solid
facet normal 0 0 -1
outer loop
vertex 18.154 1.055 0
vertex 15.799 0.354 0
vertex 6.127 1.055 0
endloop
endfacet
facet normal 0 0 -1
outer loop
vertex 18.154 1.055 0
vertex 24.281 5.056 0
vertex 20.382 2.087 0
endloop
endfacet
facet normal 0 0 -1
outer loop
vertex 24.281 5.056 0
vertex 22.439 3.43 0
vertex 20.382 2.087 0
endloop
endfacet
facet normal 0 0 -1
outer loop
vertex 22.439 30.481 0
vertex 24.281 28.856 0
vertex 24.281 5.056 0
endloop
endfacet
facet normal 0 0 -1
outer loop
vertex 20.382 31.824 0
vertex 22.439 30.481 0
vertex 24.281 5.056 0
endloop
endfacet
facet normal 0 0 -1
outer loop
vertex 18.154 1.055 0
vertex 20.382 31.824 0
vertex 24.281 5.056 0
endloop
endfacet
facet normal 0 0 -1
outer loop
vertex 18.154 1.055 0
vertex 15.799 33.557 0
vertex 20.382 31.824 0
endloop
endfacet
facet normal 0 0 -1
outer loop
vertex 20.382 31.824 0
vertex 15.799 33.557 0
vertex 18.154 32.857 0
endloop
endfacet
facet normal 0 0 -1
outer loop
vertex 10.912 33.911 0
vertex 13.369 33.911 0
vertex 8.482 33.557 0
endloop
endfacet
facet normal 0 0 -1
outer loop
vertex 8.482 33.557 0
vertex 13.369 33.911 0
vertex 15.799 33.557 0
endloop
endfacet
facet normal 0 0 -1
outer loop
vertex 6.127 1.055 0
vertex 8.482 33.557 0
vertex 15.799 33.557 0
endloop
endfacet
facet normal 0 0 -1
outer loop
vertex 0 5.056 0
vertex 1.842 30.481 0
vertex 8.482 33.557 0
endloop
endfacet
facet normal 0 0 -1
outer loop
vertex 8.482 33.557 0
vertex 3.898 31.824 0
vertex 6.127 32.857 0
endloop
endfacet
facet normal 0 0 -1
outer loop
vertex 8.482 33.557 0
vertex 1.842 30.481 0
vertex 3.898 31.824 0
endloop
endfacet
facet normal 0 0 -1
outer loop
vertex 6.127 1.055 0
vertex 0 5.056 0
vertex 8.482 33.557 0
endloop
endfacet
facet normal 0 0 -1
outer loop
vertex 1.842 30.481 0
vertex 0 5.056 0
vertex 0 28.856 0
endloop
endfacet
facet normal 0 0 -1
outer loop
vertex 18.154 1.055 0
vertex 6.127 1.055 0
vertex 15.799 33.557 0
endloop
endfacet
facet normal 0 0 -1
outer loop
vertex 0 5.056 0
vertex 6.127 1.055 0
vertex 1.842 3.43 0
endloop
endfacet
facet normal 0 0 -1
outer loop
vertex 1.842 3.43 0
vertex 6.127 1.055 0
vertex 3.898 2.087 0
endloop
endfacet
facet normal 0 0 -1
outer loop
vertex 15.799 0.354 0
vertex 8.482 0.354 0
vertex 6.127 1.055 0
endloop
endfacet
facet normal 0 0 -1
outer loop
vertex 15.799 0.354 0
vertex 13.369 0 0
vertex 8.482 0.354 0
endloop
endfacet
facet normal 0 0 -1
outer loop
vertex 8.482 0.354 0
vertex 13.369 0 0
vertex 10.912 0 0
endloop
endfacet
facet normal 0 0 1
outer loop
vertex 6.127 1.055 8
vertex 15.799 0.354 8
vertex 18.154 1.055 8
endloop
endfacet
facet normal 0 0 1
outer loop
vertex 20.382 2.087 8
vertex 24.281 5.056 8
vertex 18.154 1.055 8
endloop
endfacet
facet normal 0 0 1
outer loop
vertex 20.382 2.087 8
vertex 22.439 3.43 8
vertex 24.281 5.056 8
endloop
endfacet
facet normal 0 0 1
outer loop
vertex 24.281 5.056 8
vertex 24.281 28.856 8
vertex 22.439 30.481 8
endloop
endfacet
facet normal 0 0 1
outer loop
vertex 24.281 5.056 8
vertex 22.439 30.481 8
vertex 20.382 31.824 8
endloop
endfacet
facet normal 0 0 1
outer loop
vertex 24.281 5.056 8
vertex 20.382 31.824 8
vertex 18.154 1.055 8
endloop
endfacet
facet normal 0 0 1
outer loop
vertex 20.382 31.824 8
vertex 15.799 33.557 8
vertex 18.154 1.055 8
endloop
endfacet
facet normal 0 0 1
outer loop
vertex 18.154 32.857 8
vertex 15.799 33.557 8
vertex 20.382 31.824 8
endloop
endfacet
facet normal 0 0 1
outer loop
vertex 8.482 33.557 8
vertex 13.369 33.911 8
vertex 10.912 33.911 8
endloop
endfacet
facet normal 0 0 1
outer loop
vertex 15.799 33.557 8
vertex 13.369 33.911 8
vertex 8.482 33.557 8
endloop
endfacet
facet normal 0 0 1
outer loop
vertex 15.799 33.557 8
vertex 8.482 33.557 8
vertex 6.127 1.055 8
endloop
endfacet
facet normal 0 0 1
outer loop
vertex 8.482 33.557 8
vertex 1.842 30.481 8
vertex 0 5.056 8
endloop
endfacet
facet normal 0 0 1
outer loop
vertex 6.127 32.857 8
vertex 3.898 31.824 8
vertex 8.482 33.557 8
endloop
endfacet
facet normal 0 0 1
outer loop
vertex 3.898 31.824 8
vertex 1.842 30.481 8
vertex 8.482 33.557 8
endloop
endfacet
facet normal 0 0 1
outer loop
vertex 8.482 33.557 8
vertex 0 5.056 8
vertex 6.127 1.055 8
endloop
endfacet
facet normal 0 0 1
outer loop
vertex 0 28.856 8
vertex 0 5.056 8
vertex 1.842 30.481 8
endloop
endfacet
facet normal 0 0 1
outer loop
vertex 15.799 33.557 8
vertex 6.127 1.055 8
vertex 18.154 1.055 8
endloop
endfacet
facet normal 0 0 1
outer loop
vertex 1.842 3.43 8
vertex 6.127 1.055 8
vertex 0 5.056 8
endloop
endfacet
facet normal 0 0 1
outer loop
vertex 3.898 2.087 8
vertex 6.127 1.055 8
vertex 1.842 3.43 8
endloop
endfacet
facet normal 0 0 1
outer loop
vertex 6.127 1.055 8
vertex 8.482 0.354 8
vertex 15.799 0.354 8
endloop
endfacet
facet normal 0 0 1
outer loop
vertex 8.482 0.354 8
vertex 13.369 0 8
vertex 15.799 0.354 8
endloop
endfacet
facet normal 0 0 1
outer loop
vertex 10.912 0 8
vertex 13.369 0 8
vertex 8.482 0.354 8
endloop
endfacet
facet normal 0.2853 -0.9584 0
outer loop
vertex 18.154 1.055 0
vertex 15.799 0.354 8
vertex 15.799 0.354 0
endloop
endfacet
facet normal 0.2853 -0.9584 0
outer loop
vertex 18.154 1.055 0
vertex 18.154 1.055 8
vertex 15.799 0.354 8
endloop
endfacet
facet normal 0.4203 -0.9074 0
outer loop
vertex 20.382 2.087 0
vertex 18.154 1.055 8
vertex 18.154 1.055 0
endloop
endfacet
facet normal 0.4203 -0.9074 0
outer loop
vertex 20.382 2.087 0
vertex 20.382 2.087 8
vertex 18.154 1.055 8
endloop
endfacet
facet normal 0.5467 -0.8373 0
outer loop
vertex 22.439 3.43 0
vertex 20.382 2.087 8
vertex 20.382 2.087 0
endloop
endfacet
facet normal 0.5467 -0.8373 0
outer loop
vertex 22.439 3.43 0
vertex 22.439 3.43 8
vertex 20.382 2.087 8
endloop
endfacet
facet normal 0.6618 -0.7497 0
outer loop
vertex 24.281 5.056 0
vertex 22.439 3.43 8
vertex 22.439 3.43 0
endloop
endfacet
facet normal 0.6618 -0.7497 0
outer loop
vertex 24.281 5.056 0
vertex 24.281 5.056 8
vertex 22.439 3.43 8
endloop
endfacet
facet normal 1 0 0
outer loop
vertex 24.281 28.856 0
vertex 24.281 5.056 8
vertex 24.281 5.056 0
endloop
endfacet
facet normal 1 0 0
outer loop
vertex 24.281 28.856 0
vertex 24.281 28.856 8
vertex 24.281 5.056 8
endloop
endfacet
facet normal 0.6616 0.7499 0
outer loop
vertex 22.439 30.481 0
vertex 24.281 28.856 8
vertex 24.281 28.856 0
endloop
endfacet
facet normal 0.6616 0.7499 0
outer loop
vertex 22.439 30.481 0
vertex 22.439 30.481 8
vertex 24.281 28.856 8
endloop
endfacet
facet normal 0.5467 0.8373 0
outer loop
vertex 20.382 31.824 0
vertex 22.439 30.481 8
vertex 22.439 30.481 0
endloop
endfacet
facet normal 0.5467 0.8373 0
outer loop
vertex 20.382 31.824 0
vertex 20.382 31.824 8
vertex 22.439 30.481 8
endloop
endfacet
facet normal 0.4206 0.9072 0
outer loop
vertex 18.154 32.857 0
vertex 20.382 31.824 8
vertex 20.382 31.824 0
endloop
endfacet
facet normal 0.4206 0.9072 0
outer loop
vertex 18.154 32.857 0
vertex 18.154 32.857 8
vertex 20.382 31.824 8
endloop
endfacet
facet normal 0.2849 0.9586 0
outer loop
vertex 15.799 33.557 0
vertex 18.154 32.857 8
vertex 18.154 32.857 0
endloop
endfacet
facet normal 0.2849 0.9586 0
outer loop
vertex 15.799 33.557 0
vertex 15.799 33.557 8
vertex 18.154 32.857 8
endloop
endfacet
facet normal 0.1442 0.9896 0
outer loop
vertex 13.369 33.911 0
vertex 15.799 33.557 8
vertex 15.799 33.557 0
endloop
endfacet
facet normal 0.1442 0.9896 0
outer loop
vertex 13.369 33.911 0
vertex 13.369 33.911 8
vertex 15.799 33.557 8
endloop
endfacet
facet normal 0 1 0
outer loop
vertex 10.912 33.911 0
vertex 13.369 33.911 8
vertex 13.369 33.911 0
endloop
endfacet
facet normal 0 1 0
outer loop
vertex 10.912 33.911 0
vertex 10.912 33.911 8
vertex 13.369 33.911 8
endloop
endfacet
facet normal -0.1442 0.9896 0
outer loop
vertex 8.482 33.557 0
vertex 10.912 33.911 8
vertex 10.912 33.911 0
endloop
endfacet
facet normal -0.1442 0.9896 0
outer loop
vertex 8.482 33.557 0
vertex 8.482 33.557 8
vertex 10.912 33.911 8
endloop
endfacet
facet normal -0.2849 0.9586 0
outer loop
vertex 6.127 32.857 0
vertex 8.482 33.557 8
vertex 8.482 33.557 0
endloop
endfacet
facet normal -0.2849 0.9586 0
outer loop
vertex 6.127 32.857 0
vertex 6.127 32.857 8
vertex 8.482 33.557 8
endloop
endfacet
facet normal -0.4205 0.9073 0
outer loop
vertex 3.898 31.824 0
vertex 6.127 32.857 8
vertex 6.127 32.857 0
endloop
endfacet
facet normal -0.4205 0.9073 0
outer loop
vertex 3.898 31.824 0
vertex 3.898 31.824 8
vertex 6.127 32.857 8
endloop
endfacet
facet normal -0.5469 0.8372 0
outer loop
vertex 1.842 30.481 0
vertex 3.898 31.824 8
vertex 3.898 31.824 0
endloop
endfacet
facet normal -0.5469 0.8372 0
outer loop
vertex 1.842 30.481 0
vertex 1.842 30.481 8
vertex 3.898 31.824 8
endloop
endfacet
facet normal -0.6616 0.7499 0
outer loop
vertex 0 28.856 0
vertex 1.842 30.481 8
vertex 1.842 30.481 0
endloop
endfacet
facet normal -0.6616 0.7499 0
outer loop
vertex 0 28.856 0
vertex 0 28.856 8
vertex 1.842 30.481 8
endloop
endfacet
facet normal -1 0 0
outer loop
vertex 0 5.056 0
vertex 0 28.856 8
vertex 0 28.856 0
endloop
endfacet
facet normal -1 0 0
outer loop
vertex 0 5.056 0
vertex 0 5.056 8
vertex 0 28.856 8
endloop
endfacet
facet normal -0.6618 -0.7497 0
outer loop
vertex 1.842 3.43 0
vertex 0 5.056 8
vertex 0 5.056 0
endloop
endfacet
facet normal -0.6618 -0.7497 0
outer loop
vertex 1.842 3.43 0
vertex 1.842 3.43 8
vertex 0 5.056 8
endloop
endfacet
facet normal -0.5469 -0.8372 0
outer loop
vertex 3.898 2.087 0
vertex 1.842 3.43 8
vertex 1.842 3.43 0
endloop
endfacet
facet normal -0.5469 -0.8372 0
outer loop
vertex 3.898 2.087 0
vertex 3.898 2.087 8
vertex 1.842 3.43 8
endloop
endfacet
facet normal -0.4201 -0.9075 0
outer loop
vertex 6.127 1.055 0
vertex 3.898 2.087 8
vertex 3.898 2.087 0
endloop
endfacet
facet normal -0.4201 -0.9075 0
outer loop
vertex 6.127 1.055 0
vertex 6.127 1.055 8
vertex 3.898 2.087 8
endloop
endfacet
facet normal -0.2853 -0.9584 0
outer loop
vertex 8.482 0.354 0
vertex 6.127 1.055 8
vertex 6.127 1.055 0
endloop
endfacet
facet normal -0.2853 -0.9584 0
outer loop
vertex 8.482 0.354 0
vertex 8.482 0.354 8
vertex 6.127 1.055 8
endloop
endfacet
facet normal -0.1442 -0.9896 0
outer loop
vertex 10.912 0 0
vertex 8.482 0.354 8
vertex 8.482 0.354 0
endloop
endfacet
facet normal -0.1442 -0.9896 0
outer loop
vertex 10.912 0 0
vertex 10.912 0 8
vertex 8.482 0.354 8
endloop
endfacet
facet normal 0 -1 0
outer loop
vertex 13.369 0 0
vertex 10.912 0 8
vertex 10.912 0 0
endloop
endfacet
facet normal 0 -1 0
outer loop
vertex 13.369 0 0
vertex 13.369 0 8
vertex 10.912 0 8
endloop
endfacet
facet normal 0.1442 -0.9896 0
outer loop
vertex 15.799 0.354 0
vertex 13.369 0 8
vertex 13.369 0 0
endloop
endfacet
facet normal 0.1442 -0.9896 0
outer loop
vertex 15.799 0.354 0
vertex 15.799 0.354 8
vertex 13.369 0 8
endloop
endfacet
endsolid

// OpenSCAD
$fn = 32;

// ----------------------------------------------------------------------
// Eccentric disc: double_d, 8 mm thick
// ----------------------------------------------------------------------

// --- parameters (mm) ---
profile_height = 8;       // extrusion height
profile_points = 24;      // points of the closed outline

profile = [[24.281, 28.856], [22.439, 30.481], [20.382, 31.824], [18.154, 32.857], [15.799, 33.557], [13.369, 33.911], [10.912, 33.911], [8.482, 33.557], [6.127, 32.857], [3.898, 31.824], [1.842, 30.481], [0, 28.856], [0, 5.056], [1.842, 3.43], [3.898, 2.087], [6.127, 1.055], [8.482, 0.354], [10.912, 0], [13.369, 0], [15.799, 0.354], [18.154, 1.055], [20.382, 2.087], [22.439, 3.43], [24.281, 5.056]];  // single closed polygon, 24 points, counter clockwise

// --- the one profile operation ---
linear_extrude(height = profile_height) polygon(points = profile);
